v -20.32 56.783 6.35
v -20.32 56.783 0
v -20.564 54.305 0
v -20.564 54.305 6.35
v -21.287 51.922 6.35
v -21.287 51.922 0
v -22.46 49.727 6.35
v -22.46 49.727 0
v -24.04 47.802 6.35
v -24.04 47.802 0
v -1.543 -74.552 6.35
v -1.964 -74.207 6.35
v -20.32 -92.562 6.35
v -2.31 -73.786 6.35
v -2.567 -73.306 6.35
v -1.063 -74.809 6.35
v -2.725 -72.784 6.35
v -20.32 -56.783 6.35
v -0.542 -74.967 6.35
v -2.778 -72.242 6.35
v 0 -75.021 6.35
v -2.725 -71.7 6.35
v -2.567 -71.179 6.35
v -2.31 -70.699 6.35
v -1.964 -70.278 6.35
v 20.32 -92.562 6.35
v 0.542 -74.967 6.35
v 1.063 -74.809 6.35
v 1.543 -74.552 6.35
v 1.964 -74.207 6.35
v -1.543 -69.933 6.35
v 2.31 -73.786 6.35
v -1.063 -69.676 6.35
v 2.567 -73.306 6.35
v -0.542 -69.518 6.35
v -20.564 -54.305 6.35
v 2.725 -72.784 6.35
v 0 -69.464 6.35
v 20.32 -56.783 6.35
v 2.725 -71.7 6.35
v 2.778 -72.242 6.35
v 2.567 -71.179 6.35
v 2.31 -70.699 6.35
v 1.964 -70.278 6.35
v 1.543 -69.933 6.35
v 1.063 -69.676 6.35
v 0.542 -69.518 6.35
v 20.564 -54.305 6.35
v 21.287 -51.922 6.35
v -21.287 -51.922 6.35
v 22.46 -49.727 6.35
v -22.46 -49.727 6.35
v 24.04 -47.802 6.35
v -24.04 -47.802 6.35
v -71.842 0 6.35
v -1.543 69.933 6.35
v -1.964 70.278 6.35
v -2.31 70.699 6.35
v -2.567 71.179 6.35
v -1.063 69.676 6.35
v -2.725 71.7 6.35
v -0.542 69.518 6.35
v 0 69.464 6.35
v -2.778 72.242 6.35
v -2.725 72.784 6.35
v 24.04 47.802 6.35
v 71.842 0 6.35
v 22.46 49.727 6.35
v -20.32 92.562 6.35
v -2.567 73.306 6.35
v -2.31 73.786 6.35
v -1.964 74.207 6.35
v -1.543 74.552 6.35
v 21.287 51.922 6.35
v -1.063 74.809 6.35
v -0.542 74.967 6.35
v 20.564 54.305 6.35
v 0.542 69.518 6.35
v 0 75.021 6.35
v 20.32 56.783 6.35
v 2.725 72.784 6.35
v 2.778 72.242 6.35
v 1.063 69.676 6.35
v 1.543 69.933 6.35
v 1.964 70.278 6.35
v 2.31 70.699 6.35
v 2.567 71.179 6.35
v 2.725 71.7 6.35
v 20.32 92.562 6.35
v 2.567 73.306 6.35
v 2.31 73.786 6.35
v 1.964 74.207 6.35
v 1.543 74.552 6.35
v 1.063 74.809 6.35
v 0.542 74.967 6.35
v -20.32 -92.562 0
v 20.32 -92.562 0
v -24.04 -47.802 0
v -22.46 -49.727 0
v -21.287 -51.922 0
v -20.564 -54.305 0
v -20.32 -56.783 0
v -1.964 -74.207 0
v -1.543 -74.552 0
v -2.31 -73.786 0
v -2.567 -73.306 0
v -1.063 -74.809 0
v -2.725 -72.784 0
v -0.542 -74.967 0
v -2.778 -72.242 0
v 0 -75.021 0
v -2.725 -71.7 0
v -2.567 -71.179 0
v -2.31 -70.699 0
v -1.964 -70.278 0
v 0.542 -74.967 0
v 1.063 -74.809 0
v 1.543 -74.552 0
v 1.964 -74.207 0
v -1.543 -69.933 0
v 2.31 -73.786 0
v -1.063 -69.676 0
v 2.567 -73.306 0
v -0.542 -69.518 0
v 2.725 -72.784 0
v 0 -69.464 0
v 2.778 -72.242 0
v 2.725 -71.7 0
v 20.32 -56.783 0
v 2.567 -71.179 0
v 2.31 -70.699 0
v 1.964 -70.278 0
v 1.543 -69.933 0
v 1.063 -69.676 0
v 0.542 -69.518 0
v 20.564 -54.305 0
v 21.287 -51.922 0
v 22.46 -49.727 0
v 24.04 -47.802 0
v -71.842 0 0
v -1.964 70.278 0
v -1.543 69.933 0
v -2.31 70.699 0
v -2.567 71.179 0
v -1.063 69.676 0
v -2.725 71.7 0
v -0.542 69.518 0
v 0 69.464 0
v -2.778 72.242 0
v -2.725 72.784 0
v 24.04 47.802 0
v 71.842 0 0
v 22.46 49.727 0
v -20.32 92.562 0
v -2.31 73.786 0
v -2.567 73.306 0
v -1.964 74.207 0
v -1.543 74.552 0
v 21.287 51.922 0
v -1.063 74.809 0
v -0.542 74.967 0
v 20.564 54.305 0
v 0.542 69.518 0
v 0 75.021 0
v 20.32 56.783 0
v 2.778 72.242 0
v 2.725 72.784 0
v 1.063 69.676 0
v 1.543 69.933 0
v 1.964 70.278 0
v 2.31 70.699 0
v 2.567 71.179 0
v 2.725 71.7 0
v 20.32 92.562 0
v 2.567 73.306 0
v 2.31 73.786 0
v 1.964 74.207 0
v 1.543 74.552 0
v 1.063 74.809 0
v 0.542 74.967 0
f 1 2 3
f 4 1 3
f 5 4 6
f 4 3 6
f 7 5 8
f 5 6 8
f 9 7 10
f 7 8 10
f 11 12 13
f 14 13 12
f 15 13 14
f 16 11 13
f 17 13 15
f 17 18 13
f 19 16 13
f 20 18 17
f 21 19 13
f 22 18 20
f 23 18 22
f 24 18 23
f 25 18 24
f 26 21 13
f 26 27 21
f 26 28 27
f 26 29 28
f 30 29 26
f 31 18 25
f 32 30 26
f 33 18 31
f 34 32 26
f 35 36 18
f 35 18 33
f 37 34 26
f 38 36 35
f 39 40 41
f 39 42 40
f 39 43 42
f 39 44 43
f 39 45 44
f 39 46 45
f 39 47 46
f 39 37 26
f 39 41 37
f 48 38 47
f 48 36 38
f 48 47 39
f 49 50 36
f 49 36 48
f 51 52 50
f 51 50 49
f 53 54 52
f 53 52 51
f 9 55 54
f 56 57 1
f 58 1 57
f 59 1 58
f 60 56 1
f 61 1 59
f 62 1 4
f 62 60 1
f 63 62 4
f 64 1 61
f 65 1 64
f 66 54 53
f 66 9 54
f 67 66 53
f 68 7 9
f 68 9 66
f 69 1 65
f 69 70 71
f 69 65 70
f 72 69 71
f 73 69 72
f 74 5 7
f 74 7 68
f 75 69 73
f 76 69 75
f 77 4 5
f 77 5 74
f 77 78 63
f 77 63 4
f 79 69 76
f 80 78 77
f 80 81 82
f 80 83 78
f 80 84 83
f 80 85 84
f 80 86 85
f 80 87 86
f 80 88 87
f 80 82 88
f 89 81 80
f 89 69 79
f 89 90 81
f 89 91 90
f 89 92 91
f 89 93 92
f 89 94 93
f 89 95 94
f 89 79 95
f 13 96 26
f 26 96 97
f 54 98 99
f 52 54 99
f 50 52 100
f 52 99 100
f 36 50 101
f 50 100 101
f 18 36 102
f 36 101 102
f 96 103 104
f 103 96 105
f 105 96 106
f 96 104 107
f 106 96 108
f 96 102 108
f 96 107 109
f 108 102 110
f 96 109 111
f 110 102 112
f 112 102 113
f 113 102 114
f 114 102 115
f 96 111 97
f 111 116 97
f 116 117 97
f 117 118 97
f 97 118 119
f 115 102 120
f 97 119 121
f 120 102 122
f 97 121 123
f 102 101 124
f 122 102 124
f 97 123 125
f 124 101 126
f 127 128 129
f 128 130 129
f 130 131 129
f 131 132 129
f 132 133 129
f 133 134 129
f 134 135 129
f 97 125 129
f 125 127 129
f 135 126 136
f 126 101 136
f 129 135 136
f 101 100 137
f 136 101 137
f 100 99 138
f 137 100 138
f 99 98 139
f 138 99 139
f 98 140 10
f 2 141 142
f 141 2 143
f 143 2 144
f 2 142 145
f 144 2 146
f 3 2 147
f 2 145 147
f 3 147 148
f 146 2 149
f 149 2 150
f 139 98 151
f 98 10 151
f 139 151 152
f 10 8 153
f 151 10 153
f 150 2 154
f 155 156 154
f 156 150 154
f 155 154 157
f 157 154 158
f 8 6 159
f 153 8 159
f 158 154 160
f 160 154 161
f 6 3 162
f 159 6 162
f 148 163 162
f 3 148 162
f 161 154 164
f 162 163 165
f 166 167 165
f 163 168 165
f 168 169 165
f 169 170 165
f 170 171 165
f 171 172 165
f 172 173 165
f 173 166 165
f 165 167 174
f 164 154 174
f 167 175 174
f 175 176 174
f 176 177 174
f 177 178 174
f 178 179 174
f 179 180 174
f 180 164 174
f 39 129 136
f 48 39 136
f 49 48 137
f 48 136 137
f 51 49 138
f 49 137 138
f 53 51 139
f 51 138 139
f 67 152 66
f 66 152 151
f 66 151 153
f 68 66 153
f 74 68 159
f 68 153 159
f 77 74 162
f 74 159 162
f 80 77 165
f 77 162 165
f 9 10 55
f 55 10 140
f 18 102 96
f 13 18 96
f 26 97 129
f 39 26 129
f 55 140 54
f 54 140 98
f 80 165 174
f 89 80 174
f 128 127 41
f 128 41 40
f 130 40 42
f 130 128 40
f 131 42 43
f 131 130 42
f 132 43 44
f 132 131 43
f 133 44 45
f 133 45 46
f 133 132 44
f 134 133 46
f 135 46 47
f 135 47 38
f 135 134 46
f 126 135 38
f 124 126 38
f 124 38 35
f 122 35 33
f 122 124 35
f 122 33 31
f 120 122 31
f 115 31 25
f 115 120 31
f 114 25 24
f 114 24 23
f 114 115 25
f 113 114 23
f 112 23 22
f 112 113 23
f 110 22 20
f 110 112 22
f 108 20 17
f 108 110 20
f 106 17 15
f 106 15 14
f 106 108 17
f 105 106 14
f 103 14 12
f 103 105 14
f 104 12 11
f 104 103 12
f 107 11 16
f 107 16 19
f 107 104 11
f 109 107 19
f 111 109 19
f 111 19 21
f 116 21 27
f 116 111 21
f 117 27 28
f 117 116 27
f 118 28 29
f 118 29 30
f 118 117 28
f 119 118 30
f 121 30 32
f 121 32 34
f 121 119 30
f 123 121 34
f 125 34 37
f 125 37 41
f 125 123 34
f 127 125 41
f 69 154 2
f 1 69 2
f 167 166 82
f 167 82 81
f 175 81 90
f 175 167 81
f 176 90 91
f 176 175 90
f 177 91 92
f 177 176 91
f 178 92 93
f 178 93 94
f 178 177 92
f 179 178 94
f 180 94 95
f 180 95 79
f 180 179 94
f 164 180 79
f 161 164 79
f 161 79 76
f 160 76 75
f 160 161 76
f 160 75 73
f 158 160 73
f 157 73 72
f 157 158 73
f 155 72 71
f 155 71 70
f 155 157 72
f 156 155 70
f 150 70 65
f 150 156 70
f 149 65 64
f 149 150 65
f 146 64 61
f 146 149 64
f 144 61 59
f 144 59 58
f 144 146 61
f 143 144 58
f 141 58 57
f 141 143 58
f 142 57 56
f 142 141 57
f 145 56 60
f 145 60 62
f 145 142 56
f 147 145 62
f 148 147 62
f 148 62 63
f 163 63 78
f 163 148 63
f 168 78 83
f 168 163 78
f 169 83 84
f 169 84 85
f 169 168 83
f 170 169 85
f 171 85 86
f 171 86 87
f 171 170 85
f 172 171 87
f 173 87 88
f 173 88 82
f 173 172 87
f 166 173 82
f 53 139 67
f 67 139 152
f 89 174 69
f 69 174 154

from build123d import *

# Parameters (mm, degrees)
SKETCH1_R      = 2.778125
EXTRUDE1_DEPTH = 6.35


with BuildPart() as part:
    # Sketch1 → Extrude1 (new body)
    with BuildSketch(Plane.XY):
        with BuildLine():
            Line((71.842048969, 0), (24.039743879, 47.80230509))
            ThreePointArc((24.039743879, 47.80230509), (21.286729937, 51.92248162), (20.32, 56.782561211))
            Line((20.32, 56.782561211), (20.32, 92.56248162))
            Line((20.32, 92.56248162), (-20.32, 92.56248162))
            Line((-20.32, 92.56248162), (-20.32, 56.782561211))
            ThreePointArc((-20.32, 56.782561211), (-21.286729937, 51.92248162), (-24.039743879, 47.80230509))
            Line((-24.039743879, 47.80230509), (-71.842048969, 0))
            Line((-71.842048969, 0), (-24.039743879, -47.80230509))
            ThreePointArc((-24.039743879, -47.80230509), (-21.286729937, -51.92248162), (-20.32, -56.782561211))
            Line((-20.32, -56.782561211), (-20.32, -92.56248162))
            Line((-20.32, -92.56248162), (20.32, -92.56248162))
            Line((20.32, -92.56248162), (20.32, -56.782561211))
            ThreePointArc((20.32, -56.782561211), (21.286729937, -51.92248162), (24.039743879, -47.80230509))
            Line((24.039743879, -47.80230509), (71.842048969, 0))
        make_face()
        with Locations((0, 72.24248162)):
            Circle(SKETCH1_R, mode=Mode.SUBTRACT)
        with Locations((0, -72.24248162)):
            Circle(SKETCH1_R, mode=Mode.SUBTRACT)
    extrude(amount=EXTRUDE1_DEPTH)


solid = part.part
